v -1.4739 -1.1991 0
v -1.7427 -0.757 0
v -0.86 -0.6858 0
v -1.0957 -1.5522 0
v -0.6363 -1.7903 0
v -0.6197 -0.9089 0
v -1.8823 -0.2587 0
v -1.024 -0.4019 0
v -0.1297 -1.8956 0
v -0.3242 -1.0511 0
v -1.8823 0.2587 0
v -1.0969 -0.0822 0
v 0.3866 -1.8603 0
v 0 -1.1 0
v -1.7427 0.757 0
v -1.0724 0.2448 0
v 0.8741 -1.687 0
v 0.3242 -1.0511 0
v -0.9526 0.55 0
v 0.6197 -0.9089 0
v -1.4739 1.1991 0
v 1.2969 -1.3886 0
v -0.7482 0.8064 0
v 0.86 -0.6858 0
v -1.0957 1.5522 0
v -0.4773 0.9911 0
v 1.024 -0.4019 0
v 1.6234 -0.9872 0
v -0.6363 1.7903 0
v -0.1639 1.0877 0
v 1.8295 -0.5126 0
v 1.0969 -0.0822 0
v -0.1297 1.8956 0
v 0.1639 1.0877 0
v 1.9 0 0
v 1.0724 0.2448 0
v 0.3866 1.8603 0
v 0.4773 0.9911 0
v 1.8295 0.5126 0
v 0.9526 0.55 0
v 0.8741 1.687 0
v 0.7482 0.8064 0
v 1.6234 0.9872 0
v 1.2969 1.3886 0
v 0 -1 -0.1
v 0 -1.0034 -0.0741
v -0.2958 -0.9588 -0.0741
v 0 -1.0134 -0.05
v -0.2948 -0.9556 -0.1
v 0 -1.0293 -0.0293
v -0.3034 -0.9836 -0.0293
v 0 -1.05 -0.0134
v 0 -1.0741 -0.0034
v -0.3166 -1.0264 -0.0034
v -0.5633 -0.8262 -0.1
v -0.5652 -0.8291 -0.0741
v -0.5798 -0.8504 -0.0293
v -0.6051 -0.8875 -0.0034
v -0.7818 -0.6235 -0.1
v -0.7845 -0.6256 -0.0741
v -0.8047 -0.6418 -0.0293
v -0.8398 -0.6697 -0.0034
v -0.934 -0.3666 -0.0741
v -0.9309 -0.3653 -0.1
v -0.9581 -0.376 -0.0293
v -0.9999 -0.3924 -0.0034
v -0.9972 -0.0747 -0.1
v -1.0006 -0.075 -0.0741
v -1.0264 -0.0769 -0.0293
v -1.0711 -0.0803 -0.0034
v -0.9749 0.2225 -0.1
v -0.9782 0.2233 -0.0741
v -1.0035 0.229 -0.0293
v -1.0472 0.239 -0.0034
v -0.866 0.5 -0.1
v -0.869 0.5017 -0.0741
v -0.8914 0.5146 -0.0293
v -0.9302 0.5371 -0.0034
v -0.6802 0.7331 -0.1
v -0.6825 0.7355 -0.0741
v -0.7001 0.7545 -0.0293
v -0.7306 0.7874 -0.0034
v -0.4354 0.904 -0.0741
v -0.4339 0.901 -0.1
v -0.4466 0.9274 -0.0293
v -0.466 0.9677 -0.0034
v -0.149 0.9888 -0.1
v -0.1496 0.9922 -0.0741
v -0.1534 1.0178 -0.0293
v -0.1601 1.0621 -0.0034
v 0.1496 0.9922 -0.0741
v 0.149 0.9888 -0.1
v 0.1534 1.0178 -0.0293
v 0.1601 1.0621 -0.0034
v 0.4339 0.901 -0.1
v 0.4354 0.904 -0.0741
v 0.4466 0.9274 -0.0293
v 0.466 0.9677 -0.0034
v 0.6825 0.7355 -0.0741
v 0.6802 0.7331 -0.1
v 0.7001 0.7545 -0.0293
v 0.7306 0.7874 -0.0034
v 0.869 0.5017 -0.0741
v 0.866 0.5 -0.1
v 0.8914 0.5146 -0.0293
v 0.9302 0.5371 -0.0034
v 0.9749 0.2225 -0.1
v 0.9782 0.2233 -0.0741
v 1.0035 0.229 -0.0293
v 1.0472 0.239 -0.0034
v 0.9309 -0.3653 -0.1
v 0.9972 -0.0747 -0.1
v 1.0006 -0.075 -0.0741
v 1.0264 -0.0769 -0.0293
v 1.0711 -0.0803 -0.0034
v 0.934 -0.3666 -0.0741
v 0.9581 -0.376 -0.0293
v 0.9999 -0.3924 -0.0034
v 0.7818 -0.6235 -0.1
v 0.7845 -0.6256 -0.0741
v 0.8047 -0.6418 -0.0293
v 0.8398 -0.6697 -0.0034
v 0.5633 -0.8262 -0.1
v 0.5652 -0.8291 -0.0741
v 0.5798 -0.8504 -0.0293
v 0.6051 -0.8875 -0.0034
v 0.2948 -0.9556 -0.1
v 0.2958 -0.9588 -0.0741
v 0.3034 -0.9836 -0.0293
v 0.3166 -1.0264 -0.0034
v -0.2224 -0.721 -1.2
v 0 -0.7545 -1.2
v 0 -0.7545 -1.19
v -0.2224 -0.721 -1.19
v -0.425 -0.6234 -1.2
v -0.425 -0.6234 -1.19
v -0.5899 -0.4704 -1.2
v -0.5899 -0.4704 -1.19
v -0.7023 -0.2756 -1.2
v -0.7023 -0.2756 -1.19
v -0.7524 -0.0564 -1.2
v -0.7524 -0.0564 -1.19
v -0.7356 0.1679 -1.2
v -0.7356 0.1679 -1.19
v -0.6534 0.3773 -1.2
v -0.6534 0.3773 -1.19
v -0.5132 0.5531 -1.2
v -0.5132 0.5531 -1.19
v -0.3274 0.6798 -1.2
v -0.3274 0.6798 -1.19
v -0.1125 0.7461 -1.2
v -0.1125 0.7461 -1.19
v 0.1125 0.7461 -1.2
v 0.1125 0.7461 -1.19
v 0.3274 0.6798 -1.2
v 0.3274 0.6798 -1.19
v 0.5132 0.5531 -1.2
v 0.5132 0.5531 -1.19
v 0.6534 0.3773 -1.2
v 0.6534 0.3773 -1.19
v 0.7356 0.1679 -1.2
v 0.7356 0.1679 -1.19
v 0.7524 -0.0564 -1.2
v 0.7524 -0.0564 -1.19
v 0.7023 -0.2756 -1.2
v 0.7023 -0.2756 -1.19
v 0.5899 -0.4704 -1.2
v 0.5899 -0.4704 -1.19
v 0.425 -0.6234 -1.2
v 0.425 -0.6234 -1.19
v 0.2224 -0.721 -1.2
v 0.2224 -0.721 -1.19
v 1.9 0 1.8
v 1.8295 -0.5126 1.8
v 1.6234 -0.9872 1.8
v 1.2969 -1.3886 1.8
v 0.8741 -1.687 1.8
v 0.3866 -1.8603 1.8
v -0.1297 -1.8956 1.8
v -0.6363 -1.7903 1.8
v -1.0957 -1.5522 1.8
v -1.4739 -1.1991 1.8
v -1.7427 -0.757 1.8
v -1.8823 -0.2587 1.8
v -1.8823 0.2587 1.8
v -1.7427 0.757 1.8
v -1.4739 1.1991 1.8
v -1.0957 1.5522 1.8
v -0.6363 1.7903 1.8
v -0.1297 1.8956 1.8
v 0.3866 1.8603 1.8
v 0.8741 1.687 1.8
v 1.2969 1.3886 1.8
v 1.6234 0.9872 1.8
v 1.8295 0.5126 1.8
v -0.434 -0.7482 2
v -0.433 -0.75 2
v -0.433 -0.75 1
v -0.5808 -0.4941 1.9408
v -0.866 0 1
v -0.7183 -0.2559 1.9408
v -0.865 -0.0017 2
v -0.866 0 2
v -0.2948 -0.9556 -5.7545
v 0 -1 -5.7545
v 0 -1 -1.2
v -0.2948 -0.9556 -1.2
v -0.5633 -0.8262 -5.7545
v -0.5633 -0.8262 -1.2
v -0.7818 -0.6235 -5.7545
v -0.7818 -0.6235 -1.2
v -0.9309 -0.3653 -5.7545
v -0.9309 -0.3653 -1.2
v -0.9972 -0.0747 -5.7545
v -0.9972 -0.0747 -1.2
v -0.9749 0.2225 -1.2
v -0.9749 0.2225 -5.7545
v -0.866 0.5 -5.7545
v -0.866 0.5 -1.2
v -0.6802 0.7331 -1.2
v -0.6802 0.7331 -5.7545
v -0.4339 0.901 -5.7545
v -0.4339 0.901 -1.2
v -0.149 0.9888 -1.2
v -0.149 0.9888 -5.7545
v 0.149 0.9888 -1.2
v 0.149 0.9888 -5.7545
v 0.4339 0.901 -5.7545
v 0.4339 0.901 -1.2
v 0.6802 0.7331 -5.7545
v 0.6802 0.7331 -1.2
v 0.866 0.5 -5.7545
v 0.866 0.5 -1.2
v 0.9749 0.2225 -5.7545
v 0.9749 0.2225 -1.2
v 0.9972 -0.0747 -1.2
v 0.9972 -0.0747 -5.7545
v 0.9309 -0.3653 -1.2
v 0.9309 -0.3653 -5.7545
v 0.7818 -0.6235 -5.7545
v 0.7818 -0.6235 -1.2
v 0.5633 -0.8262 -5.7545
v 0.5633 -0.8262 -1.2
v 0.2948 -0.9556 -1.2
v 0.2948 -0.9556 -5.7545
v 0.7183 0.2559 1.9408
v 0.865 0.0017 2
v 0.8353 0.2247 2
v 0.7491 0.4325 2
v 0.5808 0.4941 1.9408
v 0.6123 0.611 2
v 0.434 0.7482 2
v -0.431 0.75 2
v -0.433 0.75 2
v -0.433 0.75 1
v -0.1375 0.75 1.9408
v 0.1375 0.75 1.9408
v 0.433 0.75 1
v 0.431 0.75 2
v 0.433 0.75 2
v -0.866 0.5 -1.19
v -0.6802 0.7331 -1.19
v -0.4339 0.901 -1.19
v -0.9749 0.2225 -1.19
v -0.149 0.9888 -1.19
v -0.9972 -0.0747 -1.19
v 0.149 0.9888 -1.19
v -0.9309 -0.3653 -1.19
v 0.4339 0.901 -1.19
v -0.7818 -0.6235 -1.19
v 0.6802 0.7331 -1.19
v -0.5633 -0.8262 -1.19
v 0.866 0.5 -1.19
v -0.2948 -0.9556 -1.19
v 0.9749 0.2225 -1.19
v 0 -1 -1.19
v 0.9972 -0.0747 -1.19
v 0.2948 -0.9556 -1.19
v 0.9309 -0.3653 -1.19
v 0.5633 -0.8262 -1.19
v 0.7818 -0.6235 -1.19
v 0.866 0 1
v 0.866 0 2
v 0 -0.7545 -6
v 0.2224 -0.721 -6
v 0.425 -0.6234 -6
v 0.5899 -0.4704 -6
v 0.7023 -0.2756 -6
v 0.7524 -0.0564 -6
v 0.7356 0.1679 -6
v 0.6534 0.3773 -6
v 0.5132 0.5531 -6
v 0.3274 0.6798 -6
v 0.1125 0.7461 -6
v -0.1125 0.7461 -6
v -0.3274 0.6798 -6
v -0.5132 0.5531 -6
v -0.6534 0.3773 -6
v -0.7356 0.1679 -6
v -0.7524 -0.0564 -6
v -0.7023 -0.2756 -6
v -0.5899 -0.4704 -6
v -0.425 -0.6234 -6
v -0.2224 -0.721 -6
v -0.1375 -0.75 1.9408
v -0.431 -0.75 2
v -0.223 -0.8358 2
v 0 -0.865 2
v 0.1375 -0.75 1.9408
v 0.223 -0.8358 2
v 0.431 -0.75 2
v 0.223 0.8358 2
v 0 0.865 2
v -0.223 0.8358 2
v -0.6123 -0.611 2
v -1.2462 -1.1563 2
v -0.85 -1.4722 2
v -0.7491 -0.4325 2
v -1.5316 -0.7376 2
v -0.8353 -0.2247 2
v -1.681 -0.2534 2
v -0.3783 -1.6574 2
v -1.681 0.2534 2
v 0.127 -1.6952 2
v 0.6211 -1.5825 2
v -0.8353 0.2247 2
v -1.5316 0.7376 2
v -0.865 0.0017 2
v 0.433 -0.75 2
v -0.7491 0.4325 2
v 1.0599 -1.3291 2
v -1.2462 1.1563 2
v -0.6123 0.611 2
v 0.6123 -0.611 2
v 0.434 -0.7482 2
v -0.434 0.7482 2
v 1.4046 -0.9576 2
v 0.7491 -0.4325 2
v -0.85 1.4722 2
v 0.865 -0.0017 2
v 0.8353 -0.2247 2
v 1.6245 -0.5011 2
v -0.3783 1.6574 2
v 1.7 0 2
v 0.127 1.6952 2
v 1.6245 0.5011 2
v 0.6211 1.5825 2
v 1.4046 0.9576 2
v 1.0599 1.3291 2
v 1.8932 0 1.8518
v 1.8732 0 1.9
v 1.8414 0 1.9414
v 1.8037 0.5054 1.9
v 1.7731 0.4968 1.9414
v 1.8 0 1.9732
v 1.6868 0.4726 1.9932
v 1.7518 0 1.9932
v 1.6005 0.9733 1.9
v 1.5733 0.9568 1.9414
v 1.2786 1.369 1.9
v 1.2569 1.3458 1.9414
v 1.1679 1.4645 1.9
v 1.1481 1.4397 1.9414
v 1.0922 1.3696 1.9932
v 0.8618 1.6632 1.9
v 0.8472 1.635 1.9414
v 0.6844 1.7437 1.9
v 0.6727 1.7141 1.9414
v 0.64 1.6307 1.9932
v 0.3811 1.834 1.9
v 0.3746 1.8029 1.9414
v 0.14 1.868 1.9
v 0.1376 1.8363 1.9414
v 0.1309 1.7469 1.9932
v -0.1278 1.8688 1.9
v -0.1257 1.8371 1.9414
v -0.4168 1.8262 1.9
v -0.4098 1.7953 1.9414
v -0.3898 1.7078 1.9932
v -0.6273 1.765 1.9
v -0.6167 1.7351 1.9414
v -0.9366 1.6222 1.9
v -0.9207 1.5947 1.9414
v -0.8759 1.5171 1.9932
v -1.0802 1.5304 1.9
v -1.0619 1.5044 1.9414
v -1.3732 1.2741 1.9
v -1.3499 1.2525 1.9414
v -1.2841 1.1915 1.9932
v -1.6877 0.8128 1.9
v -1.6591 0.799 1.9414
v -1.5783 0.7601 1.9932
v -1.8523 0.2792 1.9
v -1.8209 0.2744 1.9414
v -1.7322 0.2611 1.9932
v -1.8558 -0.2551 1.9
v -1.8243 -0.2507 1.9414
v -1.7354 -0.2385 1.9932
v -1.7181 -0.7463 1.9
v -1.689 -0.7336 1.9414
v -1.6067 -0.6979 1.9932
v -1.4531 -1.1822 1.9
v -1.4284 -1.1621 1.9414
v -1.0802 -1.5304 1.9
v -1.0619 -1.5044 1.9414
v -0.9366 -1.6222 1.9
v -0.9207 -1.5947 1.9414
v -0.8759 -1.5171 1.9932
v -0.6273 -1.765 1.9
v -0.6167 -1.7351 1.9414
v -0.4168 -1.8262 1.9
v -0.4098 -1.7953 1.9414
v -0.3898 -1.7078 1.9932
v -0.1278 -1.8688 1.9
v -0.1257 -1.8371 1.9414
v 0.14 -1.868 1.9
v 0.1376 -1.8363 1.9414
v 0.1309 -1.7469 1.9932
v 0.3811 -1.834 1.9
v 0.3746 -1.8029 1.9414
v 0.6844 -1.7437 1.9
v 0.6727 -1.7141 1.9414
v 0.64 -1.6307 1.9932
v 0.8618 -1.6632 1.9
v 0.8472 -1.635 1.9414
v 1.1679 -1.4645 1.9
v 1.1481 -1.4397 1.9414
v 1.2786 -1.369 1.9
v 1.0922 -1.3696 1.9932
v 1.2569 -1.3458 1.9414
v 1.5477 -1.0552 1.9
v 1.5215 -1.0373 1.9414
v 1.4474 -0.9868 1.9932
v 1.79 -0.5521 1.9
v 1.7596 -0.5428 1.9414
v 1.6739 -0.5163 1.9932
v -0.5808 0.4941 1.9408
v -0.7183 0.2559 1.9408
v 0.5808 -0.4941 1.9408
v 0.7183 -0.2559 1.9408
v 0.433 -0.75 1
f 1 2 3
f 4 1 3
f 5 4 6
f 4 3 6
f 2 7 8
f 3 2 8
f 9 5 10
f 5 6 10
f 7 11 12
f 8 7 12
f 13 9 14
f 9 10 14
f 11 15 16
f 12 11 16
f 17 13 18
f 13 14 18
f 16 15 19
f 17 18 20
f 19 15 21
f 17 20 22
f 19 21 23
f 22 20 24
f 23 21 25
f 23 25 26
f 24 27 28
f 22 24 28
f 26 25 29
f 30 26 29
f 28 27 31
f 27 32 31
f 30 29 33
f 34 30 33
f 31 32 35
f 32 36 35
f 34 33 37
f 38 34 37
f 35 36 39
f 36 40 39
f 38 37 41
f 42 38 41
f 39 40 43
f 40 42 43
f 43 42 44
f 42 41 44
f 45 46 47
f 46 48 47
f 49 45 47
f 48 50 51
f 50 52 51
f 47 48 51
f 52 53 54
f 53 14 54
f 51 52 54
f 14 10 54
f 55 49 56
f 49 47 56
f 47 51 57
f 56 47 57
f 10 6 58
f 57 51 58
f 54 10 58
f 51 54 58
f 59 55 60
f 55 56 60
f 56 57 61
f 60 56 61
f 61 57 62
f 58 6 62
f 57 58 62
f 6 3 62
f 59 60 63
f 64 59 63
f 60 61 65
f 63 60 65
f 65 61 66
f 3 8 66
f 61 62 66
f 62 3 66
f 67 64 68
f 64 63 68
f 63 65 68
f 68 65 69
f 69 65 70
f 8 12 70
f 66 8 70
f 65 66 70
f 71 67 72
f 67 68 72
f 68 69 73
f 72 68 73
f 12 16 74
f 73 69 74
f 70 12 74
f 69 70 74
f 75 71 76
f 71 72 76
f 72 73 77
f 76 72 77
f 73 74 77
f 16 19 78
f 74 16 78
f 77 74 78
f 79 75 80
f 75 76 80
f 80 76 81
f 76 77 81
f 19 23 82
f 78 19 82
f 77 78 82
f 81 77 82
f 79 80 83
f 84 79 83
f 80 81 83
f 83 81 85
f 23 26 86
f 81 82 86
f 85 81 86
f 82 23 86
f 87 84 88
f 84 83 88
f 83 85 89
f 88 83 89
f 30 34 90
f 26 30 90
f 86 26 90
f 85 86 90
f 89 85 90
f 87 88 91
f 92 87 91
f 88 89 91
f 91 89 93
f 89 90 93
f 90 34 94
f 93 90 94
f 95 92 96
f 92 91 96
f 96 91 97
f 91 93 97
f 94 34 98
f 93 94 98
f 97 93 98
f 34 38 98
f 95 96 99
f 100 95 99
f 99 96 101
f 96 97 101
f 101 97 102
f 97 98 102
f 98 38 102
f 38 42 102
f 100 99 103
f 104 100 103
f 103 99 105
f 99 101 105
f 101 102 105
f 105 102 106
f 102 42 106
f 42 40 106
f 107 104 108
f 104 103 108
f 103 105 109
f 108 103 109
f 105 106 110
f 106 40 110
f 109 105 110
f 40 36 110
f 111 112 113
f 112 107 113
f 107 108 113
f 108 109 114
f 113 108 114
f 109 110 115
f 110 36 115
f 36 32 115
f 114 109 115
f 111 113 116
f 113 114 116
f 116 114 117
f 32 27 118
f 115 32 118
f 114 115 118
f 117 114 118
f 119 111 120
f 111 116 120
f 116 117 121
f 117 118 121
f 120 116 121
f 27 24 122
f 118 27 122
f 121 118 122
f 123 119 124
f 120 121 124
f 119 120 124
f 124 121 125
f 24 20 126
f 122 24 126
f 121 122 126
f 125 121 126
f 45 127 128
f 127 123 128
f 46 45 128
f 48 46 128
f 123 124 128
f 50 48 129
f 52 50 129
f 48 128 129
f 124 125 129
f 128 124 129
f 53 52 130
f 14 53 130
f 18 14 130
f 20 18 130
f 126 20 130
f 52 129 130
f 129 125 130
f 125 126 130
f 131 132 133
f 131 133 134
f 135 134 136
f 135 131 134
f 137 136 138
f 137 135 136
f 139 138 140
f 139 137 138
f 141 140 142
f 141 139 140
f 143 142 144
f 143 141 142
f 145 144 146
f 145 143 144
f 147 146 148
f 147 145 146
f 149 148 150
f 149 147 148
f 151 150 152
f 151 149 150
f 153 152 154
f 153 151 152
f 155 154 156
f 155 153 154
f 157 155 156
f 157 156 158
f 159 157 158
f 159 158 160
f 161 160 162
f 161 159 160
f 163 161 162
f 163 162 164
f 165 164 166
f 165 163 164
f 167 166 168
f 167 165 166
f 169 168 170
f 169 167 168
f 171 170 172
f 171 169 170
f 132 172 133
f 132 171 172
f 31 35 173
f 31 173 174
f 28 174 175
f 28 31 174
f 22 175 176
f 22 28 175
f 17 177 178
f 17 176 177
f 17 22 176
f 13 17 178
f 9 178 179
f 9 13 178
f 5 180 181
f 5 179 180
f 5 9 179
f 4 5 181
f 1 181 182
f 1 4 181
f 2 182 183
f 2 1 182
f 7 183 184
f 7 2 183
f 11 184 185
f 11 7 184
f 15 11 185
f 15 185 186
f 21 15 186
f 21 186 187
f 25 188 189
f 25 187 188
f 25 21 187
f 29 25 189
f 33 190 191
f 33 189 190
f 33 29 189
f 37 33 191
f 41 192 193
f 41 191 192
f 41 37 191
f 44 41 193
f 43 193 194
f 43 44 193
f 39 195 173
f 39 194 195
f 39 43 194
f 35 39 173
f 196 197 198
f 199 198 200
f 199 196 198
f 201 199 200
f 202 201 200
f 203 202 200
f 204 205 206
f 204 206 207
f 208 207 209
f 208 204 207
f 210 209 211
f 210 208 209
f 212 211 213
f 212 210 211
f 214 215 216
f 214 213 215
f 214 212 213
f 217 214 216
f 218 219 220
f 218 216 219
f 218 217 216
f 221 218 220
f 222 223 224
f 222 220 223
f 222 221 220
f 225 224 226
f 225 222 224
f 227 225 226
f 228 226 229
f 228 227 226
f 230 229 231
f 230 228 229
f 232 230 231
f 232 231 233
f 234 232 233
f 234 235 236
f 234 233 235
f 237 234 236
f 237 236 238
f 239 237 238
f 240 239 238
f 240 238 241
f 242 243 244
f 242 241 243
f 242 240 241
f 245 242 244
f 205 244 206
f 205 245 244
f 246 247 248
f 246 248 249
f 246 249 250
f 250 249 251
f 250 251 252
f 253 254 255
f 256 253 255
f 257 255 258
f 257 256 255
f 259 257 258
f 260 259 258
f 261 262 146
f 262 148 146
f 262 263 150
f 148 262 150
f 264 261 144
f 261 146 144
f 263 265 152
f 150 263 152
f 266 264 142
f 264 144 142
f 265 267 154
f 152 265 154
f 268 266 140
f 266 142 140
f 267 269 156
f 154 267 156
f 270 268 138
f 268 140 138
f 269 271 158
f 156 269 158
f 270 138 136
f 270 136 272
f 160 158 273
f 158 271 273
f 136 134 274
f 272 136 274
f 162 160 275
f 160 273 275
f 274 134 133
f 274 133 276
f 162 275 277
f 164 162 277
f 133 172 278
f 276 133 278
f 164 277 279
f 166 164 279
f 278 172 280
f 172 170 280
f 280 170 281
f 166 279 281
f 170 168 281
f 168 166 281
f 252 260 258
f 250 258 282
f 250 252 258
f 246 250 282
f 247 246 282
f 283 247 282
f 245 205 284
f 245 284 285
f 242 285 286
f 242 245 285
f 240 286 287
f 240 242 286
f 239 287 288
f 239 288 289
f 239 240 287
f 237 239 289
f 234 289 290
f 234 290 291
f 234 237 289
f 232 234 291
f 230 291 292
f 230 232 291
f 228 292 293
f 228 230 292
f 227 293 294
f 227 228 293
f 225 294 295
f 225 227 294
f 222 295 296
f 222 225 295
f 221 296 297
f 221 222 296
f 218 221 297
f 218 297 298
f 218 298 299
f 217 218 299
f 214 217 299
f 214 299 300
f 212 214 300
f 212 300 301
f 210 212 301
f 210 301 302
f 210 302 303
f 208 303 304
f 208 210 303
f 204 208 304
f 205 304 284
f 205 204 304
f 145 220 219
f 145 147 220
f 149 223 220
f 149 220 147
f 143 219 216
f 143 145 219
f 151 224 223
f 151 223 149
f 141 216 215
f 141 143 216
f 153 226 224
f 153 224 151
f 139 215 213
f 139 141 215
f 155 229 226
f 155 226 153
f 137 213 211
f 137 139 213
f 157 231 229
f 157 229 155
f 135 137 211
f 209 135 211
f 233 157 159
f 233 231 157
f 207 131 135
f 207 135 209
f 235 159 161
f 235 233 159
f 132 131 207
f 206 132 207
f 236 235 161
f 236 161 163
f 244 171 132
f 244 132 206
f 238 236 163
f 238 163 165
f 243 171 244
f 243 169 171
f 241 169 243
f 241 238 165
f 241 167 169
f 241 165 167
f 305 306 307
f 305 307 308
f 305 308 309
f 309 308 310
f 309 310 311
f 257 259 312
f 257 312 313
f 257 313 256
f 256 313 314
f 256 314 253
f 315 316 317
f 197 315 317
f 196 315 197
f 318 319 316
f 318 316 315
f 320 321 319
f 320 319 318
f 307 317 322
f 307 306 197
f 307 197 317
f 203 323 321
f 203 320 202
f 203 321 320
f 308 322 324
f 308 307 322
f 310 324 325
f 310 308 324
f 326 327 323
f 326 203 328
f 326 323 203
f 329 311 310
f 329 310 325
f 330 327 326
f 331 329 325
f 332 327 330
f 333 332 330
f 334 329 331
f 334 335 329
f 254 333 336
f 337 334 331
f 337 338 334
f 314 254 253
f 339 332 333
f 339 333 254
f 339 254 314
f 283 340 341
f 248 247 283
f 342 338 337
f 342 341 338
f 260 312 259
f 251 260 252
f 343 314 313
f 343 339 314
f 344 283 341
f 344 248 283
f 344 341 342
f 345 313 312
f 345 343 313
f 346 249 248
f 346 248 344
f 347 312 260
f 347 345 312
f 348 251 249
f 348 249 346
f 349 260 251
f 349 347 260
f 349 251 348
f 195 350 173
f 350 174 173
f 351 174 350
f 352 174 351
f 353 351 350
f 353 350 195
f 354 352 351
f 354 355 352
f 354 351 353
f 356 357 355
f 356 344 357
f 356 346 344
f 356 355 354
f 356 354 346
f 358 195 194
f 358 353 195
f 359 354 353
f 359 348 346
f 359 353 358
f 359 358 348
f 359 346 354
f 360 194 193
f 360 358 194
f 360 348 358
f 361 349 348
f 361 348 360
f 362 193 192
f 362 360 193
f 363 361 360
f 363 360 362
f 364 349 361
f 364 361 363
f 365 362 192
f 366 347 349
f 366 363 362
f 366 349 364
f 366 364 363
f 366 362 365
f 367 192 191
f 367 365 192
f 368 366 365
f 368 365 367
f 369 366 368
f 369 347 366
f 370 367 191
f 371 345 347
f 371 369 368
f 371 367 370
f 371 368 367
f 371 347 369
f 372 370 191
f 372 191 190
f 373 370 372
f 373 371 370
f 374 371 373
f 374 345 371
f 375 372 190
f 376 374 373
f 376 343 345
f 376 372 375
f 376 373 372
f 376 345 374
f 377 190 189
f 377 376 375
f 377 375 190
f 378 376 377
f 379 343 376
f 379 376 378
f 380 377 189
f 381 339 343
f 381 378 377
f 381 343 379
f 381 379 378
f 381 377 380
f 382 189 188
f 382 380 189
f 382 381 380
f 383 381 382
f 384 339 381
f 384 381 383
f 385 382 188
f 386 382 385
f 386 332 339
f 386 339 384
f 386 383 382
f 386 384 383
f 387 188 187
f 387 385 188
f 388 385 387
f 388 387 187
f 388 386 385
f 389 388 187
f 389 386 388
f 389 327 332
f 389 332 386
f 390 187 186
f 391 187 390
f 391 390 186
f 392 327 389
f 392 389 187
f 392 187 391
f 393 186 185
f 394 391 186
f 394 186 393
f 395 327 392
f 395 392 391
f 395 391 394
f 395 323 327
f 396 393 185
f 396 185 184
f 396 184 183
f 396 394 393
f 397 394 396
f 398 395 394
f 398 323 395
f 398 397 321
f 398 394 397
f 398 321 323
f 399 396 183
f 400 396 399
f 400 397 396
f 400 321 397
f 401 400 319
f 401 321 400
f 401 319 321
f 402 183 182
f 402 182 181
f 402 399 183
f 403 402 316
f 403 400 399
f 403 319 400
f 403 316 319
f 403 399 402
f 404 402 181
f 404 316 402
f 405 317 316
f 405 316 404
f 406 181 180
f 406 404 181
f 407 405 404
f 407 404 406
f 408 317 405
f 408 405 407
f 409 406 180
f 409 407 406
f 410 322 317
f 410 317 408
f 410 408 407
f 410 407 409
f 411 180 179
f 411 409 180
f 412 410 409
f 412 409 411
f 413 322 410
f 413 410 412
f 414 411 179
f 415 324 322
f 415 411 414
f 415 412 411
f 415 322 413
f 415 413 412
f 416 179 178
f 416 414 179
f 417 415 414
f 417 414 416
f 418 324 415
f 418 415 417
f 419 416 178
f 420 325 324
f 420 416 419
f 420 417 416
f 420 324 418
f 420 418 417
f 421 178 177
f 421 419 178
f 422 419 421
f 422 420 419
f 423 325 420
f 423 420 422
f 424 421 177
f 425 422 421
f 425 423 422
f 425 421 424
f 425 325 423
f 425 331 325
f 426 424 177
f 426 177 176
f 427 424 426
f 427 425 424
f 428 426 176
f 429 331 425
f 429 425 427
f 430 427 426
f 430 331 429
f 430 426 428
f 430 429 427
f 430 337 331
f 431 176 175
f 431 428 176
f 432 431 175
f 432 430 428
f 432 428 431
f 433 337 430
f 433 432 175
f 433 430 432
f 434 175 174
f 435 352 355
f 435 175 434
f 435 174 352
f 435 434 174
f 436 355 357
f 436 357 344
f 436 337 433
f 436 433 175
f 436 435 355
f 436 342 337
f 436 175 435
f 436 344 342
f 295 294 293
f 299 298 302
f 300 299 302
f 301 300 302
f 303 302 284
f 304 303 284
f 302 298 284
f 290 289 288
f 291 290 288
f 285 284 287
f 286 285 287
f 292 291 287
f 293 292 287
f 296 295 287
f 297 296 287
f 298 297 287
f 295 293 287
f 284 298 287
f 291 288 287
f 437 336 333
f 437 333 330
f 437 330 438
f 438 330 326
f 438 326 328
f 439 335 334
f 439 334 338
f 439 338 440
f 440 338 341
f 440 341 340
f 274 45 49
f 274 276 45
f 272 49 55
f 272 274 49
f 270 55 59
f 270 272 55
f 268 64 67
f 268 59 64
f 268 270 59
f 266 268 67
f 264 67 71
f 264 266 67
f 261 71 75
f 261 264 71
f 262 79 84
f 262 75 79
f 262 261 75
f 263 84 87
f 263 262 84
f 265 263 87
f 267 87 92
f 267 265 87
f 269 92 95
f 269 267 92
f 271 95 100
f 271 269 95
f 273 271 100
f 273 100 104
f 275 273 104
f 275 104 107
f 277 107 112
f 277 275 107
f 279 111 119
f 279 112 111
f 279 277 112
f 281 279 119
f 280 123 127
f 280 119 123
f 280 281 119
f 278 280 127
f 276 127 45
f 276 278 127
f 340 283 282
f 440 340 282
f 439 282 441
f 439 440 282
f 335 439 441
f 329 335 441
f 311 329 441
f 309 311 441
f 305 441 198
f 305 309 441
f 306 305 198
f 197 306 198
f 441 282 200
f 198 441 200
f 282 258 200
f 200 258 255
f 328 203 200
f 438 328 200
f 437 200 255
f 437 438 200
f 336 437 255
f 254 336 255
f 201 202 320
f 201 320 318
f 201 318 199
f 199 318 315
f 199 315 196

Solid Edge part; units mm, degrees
sketch "Sketch1" plane through (0, 0, 0) normal (0, 0, 1) x (1, 0, 0)
  circle A0 centre (0, 0) radius 1.9
extrude "Protrusion1" add sketch "Sketch1" along normal blind 2
sketch "Sketch2" plane through (0, 0, 2) normal (0, 0, 1) x (0, 1, 0)
  line L0 (0, 0.866) -> (0.75, 0.433)
  line L1 (0.75, 0.433) -> (0.75, -0.433)
  line L2 (0.75, -0.433) -> (0, -0.866)
  line L3 (0, -0.866) -> (-0.75, -0.433)
  line L4 (-0.75, -0.433) -> (-0.75, 0.433)
  line L5 (-0.75, 0.433) -> (0, 0.866)
extrude "Cutout1" cut sketch "Sketch2" against normal blind 1
fillet "Round1" radius 0.2 1 edges at (-1.9, 0, 2)
sketch "Sketch3" plane through (0, 0, 0) normal (1, 0, 0) x (0, 1, 0)
  line L0 (-0.7545, -6) -> (0, -6)
  line L1 (-1, -5.7545) -> (-0.7545, -6)
  line L2 (-1, -1.2) -> (-1, -5.7545)
  line L3 (-0.7545, -1.2) -> (-1, -1.2)
  line L4 (-0.7545, -1.19) -> (-0.7545, -1.2)
  line L5 (-1, -1.19) -> (-0.7545, -1.19)
  line L6 (-1, -0.1) -> (-1, -1.19)
  arc A0 (-1, -0.1) -> (-1.1, 0) centre (-1.1, -0.1) ccw
  dimension "D1" = 1.2
  dimension "D2" = 0.01
  dimension "D3" = 0.1
  dimension "D4" = 6
revolve "RevolvedProtrusion1" add sketch "Sketch3" angle 360 about axis through (0, 0, -60.325) along (0, 0, 1) material side at (0, -0.3772, -5.95)
cosmetic_thread "Thread1" size "M2"
sketch "Sketch4" plane through (0, 0, 0) normal (0, -1, 0) x (1, 0, 0)
  line L0 (-0.865, 2) -> (0, 1.5006)
revolve "RevolvedCutout1" cut sketch "Sketch4" angle 360 about axis through (0, 0, 57.15) along (0, 0, -1) material side at (-0.4075, 0, 1.7936)
properties material "Stahl"
